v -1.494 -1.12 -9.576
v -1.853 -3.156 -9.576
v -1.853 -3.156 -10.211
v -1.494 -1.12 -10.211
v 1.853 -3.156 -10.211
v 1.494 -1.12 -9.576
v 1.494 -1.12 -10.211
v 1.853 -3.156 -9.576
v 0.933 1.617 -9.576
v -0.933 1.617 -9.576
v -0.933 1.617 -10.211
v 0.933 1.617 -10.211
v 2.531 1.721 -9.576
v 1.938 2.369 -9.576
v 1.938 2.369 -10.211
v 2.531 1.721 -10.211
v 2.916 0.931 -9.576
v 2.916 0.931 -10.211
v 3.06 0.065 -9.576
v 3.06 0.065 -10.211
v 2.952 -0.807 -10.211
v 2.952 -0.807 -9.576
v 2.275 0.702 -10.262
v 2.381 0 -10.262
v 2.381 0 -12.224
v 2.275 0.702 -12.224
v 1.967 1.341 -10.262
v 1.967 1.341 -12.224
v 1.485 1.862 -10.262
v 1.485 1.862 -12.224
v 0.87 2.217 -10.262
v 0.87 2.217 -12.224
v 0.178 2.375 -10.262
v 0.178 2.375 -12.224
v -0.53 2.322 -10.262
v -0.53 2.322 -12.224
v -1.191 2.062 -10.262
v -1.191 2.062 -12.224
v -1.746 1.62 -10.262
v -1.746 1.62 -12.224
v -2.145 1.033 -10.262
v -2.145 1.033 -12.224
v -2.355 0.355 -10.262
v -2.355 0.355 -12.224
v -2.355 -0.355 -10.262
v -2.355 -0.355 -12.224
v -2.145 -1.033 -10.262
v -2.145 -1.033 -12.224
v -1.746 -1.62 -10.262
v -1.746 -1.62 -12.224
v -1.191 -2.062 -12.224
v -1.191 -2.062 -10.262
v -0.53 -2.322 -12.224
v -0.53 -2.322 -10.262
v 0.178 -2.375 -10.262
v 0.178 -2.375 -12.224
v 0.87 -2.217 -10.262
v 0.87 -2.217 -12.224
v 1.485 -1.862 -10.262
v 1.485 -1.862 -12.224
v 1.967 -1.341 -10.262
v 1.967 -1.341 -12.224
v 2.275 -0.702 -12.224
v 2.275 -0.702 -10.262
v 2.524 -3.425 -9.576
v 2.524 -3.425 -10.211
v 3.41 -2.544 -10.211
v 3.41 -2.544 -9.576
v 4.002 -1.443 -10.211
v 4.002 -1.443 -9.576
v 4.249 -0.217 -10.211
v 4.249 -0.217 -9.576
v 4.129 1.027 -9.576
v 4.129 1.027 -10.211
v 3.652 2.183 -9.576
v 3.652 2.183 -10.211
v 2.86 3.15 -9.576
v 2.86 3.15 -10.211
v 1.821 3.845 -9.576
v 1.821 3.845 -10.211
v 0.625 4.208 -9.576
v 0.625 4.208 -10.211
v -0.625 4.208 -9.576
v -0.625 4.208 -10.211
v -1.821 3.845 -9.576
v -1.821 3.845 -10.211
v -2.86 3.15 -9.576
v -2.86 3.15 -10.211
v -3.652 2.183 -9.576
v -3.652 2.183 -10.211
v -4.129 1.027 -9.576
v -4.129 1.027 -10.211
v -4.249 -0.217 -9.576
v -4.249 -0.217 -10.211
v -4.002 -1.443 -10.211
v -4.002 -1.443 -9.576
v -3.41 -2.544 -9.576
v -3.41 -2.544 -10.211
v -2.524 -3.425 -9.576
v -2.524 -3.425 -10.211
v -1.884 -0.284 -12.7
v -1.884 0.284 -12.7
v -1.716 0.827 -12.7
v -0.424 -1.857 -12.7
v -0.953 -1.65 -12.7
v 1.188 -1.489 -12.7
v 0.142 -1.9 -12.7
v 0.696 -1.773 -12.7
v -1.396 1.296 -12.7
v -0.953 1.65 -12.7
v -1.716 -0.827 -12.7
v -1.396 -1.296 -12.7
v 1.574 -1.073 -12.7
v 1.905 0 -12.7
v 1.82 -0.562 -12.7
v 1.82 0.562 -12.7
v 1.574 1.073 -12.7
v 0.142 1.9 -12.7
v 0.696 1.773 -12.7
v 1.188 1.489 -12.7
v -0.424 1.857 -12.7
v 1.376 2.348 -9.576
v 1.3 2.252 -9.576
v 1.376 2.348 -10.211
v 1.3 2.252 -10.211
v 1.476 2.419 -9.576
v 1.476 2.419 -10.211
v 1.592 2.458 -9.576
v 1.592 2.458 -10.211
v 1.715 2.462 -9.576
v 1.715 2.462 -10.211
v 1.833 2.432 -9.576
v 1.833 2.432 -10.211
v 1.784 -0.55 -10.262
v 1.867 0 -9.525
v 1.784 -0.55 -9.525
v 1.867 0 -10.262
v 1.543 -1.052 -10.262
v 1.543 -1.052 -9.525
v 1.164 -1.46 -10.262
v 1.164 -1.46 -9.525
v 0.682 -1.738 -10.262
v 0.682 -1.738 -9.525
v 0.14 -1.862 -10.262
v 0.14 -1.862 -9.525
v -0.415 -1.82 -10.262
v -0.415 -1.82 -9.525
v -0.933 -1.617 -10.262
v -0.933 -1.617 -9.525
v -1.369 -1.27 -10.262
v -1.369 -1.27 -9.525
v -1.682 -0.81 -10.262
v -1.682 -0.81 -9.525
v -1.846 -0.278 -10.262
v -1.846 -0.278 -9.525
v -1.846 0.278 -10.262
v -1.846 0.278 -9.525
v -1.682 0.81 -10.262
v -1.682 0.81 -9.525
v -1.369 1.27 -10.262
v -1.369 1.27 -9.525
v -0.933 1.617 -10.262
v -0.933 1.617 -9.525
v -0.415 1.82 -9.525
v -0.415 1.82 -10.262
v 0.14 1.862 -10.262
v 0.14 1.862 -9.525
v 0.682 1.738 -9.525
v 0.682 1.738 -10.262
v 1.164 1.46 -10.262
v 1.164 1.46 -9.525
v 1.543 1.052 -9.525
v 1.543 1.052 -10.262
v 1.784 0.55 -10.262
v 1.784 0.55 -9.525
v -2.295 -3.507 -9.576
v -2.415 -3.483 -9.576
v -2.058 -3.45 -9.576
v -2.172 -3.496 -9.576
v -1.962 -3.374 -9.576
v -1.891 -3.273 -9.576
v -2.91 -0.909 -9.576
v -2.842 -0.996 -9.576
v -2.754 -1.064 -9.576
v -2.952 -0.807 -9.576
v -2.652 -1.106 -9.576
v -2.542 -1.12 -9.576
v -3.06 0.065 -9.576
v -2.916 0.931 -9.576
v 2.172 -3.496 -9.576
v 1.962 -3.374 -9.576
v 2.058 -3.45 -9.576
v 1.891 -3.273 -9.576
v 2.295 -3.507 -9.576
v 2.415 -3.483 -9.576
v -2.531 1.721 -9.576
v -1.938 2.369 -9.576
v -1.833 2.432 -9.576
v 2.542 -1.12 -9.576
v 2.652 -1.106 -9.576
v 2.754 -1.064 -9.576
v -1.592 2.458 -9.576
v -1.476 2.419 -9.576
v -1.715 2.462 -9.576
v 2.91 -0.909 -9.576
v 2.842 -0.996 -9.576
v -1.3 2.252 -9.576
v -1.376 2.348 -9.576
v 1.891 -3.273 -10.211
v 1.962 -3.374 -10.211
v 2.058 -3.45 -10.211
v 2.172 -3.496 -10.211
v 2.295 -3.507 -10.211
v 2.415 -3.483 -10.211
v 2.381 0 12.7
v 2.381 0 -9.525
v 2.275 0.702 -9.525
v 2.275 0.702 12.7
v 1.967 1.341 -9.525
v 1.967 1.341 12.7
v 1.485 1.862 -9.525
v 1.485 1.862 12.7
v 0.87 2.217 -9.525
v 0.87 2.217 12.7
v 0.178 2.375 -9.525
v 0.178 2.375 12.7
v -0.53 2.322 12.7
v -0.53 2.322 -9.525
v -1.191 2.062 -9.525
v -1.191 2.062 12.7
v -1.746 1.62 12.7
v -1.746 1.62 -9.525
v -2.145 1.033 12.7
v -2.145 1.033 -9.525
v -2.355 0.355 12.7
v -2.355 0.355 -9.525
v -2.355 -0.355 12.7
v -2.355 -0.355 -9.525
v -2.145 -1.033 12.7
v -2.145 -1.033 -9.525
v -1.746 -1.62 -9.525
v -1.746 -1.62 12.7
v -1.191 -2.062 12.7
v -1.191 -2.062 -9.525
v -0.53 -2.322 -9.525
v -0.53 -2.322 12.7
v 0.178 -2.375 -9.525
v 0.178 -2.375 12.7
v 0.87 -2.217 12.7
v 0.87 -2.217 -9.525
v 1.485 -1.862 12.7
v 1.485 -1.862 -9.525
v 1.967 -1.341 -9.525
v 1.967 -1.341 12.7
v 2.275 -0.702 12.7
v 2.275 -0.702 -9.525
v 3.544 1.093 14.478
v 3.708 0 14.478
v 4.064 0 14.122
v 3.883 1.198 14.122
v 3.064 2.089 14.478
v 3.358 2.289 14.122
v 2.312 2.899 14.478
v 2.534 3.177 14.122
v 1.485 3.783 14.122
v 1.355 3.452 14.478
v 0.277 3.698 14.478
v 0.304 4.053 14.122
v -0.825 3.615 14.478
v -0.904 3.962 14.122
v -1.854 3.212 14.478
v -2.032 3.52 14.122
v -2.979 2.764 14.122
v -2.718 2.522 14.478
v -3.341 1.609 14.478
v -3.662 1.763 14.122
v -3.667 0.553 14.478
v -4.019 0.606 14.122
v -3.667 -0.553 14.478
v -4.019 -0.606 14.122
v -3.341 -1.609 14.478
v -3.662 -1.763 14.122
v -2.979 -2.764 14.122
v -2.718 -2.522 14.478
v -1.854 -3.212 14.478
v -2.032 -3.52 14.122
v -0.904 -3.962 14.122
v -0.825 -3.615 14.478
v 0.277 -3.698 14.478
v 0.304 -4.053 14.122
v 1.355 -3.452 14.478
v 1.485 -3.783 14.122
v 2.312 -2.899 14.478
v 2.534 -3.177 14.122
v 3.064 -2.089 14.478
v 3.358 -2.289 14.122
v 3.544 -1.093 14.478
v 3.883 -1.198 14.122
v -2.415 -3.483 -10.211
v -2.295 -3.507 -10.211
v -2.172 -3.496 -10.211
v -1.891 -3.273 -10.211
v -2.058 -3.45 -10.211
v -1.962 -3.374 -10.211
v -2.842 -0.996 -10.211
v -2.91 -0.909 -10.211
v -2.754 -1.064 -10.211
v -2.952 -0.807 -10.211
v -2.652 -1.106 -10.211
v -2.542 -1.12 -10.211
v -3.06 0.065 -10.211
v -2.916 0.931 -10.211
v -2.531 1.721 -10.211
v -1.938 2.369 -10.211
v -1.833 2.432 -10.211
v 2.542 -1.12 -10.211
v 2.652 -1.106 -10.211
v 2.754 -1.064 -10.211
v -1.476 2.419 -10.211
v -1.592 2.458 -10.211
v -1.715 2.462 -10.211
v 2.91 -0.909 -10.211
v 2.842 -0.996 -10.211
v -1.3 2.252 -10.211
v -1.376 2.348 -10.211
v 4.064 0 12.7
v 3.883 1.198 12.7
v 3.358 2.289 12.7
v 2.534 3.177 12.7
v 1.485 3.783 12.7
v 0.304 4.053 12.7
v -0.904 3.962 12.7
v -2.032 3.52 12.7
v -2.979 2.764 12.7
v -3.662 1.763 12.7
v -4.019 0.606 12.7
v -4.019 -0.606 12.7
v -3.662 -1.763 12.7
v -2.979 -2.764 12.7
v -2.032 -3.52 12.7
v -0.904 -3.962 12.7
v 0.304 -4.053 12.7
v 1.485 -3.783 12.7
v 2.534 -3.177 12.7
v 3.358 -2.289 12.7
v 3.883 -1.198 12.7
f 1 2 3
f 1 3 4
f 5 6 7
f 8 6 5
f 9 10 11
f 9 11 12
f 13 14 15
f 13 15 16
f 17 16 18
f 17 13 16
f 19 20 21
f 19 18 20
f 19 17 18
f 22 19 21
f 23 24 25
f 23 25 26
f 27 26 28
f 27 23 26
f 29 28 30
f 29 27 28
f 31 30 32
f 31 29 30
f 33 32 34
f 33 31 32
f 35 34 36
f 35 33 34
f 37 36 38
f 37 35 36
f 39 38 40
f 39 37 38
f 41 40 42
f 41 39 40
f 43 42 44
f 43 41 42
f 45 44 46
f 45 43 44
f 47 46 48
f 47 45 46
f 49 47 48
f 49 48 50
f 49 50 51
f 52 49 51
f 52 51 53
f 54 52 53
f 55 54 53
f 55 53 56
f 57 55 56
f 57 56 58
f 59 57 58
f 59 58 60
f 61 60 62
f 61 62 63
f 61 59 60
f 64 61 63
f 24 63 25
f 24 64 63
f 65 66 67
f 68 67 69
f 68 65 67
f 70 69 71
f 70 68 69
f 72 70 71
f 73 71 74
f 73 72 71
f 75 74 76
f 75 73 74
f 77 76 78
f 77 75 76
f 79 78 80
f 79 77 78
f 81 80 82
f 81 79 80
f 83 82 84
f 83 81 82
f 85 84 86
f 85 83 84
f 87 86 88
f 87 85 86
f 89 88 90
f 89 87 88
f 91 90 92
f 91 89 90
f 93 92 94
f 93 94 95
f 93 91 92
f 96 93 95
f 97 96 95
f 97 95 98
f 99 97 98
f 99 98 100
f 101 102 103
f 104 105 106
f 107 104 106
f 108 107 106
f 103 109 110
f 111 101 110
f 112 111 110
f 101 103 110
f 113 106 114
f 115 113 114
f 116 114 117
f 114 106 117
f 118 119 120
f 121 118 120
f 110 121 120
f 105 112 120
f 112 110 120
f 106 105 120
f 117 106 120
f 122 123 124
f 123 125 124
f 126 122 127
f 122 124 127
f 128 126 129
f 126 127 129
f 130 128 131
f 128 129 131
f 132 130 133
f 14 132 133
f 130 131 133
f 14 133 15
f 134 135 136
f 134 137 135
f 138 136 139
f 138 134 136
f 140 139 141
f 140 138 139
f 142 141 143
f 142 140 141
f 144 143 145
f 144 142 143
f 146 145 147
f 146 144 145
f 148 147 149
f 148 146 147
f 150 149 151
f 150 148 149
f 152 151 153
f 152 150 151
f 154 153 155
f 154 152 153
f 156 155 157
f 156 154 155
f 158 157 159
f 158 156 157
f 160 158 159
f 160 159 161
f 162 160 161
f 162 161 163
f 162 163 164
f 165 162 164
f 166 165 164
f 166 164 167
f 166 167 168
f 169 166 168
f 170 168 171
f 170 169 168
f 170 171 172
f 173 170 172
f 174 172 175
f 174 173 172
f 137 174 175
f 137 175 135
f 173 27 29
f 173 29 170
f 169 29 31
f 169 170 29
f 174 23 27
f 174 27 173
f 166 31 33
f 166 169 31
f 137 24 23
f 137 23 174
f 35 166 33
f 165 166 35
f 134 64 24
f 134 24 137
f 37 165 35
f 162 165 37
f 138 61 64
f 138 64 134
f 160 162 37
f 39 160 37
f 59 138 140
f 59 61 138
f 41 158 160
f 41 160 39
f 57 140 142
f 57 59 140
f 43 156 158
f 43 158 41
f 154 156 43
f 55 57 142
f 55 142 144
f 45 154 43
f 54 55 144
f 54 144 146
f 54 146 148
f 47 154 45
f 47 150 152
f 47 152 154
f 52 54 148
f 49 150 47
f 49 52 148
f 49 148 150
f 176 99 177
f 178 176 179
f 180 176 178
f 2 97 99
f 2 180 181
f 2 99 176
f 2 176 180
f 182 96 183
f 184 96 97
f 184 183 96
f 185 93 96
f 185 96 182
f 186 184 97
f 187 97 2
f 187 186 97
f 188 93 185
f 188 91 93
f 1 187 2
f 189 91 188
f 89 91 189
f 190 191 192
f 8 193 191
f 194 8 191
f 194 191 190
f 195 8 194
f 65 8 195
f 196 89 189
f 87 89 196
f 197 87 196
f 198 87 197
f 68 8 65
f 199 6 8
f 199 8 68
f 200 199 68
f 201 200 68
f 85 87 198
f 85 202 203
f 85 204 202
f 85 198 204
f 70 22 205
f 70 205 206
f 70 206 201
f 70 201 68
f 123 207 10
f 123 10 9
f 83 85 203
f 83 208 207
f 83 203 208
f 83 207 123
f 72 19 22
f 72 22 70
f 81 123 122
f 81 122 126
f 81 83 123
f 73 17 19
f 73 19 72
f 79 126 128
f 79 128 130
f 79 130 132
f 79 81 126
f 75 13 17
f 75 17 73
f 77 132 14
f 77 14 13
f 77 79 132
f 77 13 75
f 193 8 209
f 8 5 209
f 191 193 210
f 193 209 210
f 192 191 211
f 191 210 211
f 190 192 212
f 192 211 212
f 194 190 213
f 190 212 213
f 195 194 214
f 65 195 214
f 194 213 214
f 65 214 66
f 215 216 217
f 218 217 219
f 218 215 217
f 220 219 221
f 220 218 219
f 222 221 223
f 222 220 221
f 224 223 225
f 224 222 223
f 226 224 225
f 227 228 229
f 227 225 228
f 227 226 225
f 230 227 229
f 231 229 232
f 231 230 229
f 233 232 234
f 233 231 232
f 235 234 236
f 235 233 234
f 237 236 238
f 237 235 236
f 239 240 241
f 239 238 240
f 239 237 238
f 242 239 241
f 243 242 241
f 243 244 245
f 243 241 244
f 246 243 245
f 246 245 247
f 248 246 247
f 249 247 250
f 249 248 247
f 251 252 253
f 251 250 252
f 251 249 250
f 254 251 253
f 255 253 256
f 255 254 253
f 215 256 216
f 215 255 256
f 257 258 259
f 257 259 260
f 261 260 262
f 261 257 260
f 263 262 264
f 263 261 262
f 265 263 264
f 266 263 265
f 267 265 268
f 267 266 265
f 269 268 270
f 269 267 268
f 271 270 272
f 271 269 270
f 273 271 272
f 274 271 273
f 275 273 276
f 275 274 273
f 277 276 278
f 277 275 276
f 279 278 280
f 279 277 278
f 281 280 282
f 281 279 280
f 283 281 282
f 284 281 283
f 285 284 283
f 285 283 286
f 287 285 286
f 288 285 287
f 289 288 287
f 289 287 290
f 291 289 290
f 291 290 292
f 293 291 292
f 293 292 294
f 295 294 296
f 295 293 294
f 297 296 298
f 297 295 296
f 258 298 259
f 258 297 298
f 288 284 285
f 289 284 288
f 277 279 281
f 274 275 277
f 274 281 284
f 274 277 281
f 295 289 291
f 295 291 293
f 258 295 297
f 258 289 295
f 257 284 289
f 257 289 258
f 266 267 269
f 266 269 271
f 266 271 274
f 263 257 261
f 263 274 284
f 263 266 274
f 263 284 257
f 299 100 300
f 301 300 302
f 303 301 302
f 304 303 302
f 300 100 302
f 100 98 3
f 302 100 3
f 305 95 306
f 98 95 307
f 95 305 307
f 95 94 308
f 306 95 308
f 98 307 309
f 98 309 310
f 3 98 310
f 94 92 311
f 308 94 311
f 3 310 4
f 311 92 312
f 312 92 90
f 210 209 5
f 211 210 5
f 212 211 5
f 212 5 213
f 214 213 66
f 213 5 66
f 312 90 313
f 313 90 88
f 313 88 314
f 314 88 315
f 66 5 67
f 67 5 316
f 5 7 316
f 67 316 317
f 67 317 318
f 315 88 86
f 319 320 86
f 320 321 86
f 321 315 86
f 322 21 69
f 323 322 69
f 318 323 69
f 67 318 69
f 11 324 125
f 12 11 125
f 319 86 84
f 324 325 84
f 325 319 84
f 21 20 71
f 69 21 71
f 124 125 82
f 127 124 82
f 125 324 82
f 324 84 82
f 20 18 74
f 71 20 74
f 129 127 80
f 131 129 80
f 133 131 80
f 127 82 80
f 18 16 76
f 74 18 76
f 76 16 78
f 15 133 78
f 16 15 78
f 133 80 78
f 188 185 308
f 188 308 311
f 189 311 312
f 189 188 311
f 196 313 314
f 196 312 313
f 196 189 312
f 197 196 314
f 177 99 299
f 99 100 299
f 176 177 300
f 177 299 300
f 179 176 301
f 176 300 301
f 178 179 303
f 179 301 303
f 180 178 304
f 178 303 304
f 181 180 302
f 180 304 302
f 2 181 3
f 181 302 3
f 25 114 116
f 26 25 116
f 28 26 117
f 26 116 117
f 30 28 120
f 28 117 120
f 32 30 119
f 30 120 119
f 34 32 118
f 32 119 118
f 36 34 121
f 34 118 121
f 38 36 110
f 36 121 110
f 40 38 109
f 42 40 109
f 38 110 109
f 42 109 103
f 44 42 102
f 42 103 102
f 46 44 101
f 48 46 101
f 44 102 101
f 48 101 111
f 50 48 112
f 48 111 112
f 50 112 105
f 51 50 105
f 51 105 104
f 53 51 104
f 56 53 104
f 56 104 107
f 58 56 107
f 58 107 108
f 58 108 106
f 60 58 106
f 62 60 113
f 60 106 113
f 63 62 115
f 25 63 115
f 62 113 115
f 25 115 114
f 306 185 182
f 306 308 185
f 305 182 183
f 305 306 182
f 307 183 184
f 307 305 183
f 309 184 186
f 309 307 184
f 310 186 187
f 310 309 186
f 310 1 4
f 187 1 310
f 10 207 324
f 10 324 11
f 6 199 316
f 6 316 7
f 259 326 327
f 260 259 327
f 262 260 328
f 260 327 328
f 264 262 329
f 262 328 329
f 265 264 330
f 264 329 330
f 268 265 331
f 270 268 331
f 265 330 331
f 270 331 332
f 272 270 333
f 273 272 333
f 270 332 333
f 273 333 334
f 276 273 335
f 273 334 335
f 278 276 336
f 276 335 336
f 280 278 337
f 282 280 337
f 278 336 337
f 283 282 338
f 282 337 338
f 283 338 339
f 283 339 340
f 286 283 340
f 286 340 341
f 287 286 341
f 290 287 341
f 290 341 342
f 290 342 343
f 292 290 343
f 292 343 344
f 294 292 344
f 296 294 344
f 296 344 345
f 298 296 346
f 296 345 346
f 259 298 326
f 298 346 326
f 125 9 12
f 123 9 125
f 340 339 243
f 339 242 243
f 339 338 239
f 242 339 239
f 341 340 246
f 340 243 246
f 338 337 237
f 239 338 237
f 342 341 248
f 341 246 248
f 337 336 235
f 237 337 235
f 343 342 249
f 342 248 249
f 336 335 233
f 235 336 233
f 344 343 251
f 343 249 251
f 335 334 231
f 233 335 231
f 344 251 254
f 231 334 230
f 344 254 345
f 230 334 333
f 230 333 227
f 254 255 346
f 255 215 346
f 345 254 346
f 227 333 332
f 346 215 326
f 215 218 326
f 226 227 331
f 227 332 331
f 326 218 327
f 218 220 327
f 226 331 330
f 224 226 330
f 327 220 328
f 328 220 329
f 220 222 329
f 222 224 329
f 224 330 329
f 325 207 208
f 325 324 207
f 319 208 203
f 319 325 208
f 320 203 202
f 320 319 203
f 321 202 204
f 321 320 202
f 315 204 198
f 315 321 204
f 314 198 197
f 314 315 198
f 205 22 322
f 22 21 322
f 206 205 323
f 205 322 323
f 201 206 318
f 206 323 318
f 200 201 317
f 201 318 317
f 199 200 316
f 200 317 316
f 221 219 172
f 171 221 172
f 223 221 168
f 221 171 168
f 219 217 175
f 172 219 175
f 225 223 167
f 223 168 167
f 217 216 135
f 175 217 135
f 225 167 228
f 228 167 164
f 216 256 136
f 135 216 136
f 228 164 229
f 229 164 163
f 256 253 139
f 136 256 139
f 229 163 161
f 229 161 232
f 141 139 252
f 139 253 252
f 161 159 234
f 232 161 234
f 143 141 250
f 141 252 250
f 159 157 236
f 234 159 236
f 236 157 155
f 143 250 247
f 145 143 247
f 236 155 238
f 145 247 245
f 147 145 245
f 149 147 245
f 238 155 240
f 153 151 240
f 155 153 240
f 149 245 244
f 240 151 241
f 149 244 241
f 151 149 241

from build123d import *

# Parameters (mm, degrees)
SKETCH2_R      = 2.38125
EXTRUDE1_DEPTH = 12.7
SKETCH3_W      = 0.7366
SKETCH3_H      = 0.51435
SKETCH8_R      = 4.064
EXTRUDE6_DEPTH = 1.778
CHAMFER2_SIZE  = 0.3556
SKETCH4_R      = 4.2545
SKETCH4_R_2    = 1.8669
EXTRUDE2_DEPTH = 0.3175
EXTRUDE4_DEPTH = 16.678457338
EXTRUDE5_DEPTH = 0.635
FILLET1_R      = 0.42545
CHAMFER1_SIZE  = 0.47625


with BuildPart() as part:
    # Sketch2 → Extrude1 (new, symmetric)
    with BuildSketch(Plane.XY):
        Circle(SKETCH2_R)
    extrude(amount=EXTRUDE1_DEPTH, both=True)

    # Sketch3 → Cut-Revolve1 (revolve, cut)
    with BuildSketch(Plane(origin=(0, 0, 0), x_dir=(0, 0, -1), z_dir=(1, 0, 0)), mode=Mode.PRIVATE) as cut_revolve1_sk:
        with Locations((9.8933, 2.124075)):
            Rectangle(SKETCH3_W, SKETCH3_H)
    revolve(cut_revolve1_sk.sketch.rotate(Axis((0, 0, 12.7), (0, 0, -1)), 90), axis=Axis((0, 0, 12.7), (0, 0, -1)), mode=Mode.SUBTRACT)

    # Sketch8 → Extrude6 (add)
    with BuildSketch(Plane.XY.offset(12.7)):
        Circle(SKETCH8_R)
    extrude(amount=EXTRUDE6_DEPTH)

    # Chamfer2
    chamfer2_edges = [part.edges().sort_by_distance(p)[0] for p in [
        (-4.064, 0, 14.478),
    ]]
    chamfer(chamfer2_edges, length=CHAMFER2_SIZE)

    # Chamfer1
    chamfer1_edges = [part.edges().sort_by_distance(p)[0] for p in [
        (-2.38125, 0, -12.7),
    ]]
    chamfer(chamfer1_edges, length=CHAMFER1_SIZE)


with BuildPart() as body_2:
    # Sketch4 → Extrude2 (new, symmetric)
    with BuildSketch(Plane.XY.offset(-9.8933)):
        Circle(SKETCH4_R)
        Circle(SKETCH4_R_2, mode=Mode.SUBTRACT)
    extrude(amount=EXTRUDE2_DEPTH, both=True)

    # Sketch5 → Extrude4 (cut, through all)
    with BuildSketch(Plane.XY):
        with BuildLine():
            Line((-1.53035, 2.650643953), (0, 0))
            Line((0, 0), (1.53035, 2.650643953))
            ThreePointArc((1.53035, 2.650643953), (2.889287878, 1.00990101), (2.84836284, -1.12014))
            Line((2.84836284, -1.12014), (1.49352, -1.12014))
            Line((1.49352, -1.12014), (1.96168838, -3.775254819))
            ThreePointArc((1.96168838, -3.775254819), (0, -4.2545), (-1.96168838, -3.775254819))
            Line((-1.96168838, -3.775254819), (-1.49352, -1.12014))
            Line((-1.49352, -1.12014), (-2.84836284, -1.12014))
            ThreePointArc((-2.84836284, -1.12014), (-2.889287878, 1.00990101), (-1.53035, 2.650643953))
        make_face()
    extrude(amount=-EXTRUDE4_DEPTH, mode=Mode.SUBTRACT)

    # Sketch6 → Extrude5 (add)
    with BuildSketch(Plane.XY.offset(-9.5758)):
        with BuildLine():
            Line((-0.93345, 1.616782826), (0.93345, 1.616782826))
            ThreePointArc((0.93345, 1.616782826), (0, 1.8669), (-0.93345, 1.616782826))
        make_face()
    extrude(amount=-EXTRUDE5_DEPTH)

    # Fillet1
    fillet1_edges = [body_2.edges().sort_by_distance(p)[0] for p in [
        (1.53035, 2.650643953, -9.8933),
        (1.96168838, -3.775254819, -9.8933),
        (-2.84836284, -1.12014, -9.8933),
        (2.84836284, -1.12014, -9.8933),
        (-1.96168838, -3.775254819, -9.8933),
        (-1.53035, 2.650643953, -9.8933),
    ]]
    fillet(fillet1_edges, radius=FILLET1_R)


solid = Compound([part.part, body_2.part])
